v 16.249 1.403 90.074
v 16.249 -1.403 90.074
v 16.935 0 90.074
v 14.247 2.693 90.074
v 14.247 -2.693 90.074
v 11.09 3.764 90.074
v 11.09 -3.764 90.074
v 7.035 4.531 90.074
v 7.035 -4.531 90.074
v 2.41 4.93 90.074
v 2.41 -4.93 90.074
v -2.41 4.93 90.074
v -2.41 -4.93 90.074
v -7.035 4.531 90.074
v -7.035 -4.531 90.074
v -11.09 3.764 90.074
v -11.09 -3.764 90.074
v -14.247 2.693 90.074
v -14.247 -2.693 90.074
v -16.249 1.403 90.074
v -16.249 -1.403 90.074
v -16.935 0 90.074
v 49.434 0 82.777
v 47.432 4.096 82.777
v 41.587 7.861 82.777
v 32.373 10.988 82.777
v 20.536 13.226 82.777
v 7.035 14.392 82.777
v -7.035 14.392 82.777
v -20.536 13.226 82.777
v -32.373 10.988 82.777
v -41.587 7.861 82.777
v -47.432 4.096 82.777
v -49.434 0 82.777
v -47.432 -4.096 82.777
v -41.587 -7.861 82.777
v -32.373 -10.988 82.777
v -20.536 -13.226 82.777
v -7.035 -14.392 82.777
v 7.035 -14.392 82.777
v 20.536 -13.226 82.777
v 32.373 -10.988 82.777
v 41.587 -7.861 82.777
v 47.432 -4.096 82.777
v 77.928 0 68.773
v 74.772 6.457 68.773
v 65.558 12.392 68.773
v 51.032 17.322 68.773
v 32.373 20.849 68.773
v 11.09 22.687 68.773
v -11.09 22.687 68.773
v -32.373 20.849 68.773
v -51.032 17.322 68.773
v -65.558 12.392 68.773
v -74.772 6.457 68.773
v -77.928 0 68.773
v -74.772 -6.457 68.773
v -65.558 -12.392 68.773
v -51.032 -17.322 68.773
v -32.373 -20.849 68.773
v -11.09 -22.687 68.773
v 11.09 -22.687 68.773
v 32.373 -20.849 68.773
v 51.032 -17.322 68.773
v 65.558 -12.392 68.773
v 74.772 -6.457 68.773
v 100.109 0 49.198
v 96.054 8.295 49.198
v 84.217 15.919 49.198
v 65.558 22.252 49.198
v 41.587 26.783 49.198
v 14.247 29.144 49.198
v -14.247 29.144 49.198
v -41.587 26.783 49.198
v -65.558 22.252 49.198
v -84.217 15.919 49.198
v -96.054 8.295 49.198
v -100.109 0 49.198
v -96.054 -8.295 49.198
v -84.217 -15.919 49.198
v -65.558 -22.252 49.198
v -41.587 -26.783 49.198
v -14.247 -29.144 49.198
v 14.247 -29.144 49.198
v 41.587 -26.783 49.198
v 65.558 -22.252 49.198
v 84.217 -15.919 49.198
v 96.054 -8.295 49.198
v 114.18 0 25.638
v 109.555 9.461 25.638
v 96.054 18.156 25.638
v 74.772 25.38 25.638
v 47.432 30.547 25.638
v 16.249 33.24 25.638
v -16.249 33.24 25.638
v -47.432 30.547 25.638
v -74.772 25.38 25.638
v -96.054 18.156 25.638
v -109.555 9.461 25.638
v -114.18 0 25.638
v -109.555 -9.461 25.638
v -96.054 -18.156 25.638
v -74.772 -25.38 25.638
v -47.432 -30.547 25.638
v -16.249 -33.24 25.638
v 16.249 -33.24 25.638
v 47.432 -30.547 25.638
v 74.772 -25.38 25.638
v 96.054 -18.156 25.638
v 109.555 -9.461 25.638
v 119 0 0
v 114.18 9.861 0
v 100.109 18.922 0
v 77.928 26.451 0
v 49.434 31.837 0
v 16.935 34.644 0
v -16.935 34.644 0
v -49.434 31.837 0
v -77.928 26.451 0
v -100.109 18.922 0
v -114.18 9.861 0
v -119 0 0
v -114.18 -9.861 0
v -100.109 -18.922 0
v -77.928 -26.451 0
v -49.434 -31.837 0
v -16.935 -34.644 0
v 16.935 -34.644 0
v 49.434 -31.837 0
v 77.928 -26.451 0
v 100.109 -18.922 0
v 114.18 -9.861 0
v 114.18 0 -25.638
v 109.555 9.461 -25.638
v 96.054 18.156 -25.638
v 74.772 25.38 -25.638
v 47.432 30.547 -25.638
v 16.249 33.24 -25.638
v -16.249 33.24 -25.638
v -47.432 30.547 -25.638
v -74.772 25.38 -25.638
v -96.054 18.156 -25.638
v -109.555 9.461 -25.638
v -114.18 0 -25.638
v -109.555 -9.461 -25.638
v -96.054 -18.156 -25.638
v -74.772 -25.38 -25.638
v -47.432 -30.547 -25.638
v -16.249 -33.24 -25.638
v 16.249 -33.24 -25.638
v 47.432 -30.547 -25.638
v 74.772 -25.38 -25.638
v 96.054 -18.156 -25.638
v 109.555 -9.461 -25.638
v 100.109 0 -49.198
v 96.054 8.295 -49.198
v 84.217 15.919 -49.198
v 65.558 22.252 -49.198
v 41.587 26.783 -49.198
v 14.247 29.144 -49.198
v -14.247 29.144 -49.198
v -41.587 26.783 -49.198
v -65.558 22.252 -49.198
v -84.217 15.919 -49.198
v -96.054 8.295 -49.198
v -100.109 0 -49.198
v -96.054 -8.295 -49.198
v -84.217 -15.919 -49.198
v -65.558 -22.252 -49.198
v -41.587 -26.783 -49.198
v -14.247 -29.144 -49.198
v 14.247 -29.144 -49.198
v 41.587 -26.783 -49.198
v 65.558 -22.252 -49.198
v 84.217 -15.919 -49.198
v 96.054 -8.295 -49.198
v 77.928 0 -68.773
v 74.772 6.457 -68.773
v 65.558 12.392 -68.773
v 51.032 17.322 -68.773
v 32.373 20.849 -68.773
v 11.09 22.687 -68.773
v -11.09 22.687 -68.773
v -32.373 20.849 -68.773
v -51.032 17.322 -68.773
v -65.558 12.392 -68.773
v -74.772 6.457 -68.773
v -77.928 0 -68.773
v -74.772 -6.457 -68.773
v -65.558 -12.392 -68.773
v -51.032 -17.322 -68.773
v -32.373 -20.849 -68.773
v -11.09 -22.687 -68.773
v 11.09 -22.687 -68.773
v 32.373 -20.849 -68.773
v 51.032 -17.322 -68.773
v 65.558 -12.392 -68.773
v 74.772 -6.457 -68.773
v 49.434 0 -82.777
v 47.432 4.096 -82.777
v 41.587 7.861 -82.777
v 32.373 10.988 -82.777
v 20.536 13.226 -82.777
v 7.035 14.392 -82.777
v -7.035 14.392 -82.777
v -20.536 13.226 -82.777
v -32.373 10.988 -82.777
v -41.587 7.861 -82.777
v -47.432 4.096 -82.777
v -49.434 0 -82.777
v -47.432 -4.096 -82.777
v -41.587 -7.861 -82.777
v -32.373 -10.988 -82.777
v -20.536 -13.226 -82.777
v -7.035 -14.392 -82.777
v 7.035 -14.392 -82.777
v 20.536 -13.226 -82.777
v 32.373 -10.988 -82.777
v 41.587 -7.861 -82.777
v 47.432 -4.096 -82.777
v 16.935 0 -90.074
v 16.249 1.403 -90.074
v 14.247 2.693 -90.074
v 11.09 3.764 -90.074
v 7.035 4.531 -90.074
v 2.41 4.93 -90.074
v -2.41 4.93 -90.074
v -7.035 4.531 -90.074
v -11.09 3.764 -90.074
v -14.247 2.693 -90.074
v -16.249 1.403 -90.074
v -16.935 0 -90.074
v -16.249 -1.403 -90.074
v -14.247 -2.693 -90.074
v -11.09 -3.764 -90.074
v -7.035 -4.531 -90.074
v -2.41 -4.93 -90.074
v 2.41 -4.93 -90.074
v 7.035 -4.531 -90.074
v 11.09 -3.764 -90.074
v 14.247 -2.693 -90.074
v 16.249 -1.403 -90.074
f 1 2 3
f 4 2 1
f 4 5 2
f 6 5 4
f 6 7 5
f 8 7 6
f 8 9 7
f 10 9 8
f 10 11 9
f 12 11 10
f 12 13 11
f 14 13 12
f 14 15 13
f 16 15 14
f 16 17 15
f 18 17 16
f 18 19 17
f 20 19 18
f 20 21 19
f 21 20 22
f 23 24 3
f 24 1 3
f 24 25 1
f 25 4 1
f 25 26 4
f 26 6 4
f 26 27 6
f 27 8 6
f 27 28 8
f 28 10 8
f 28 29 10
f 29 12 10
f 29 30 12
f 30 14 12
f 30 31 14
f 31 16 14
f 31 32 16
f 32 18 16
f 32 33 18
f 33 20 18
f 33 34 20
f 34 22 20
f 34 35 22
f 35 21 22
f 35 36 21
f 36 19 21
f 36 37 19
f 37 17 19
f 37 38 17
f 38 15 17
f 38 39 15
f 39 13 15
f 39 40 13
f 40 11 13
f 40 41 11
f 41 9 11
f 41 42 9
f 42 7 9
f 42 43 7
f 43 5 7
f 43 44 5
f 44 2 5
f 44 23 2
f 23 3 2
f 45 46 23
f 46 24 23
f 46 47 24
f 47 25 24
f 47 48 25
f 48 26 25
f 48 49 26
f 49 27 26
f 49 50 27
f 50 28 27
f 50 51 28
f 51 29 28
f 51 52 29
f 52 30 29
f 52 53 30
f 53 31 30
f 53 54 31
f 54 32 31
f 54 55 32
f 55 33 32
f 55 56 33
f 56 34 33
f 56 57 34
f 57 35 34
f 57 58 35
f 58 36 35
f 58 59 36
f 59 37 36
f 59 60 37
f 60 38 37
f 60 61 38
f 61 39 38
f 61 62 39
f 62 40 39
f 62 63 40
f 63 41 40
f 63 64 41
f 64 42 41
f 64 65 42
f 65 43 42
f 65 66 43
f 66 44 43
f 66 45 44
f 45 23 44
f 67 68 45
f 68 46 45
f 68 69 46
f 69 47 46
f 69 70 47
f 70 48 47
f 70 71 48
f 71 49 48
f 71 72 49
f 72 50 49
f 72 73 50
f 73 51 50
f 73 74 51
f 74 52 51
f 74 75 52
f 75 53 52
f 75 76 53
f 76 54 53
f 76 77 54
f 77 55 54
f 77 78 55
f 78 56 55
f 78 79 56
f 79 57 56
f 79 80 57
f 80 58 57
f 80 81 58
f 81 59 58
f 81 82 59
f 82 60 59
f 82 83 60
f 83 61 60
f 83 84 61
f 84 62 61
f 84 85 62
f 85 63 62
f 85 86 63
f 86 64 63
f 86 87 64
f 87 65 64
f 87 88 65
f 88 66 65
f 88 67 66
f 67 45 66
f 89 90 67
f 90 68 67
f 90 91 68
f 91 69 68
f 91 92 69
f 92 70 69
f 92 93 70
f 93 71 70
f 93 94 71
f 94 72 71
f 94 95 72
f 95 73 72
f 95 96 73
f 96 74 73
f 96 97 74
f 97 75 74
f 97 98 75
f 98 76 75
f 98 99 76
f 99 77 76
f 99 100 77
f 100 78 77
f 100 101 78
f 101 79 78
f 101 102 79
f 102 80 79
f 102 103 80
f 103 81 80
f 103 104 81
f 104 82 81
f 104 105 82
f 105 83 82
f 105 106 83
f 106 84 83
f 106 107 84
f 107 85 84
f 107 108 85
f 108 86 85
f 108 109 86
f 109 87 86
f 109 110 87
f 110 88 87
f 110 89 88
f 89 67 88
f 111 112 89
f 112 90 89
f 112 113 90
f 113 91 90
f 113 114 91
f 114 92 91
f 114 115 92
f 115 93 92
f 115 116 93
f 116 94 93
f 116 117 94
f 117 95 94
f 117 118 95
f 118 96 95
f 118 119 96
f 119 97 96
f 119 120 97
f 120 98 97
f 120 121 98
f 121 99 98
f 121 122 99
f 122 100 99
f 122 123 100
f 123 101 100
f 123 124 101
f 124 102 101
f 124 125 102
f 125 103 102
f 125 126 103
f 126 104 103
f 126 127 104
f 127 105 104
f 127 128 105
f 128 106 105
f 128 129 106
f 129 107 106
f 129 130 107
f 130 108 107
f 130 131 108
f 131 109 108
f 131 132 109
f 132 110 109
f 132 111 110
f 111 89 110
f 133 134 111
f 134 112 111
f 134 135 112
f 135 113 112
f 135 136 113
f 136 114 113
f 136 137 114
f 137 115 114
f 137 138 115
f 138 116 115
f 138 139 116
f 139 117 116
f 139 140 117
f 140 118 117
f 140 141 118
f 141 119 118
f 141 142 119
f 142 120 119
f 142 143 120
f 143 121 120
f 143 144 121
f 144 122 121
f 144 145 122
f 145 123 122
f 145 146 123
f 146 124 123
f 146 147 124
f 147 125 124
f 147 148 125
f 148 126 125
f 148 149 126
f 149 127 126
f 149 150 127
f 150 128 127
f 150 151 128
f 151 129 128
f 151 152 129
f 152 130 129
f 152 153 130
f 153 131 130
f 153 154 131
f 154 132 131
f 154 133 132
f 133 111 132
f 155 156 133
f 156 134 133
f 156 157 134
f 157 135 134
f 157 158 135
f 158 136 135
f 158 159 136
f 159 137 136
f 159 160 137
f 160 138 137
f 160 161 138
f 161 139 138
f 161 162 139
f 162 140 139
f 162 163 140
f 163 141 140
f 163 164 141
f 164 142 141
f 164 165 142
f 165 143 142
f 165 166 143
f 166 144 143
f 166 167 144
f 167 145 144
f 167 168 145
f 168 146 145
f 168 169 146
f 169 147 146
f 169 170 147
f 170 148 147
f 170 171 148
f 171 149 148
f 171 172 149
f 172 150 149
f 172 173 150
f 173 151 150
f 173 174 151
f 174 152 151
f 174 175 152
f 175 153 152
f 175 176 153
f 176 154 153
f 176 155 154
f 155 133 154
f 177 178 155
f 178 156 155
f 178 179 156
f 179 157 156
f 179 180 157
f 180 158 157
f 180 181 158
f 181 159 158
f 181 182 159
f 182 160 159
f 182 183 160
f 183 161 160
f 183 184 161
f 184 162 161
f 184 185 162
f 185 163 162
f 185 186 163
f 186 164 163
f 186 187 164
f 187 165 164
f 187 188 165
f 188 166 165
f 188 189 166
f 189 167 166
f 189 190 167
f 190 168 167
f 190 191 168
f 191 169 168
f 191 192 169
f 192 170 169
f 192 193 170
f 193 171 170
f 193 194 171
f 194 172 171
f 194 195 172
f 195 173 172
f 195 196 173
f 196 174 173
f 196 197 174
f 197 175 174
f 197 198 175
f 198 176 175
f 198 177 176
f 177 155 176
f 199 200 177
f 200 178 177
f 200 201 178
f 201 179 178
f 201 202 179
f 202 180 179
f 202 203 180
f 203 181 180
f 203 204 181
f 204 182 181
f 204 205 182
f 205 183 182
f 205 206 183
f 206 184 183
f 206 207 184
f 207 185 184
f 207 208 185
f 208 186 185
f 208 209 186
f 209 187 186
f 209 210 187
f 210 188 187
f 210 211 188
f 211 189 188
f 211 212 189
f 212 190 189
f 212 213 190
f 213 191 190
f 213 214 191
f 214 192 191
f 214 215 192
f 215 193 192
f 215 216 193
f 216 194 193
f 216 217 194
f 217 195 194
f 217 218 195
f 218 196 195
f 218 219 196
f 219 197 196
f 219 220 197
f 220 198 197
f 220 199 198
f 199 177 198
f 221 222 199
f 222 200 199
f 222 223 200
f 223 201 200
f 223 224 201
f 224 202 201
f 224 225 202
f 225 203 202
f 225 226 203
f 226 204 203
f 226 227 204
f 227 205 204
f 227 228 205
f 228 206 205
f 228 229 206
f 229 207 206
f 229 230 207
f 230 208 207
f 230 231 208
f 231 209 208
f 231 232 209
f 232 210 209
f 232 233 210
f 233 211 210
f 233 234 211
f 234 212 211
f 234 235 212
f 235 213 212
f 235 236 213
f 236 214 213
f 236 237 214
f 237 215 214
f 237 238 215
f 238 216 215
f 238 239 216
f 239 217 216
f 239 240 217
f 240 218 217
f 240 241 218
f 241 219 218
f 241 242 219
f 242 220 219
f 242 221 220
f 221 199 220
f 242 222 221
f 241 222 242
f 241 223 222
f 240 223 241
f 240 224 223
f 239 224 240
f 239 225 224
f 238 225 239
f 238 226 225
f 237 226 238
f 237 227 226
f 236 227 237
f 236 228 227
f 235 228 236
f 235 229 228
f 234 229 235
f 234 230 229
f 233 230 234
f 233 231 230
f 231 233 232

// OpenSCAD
// Generated by SolidPython 1.0.1 on 2020-07-29 00:46:52


scale(v = [17, 5, 13]) {
	sphere(r = 7);
}
/***********************************************
*********      SolidPython code:      **********
************************************************
 
# import packages: SolidPython
from solid import *
from solid.utils import *
from itertools import chain, combinations, permutations


class Resize:

    def __init__(self, scad_file):
        self.scad_file = scad_file
        #self.scad_file = import_scad(scad_file)
        # cone/cylinder param:
        self.r1 = 0
        self.r2 = 0
        self.h = 0
        # rectangular prism param:
        self.w = 0
        self.l = 0
        # ellipse param:
        self.r = 0

    # import OpenScad code (file name corresponds to shape)


    # classify shape + parameters
    def assign(self, param1, param2, param3):
        if self.scad_file == 'cone.scad':
            self.r1 = param1
            self.r2 = param2
            self.h = param3
        elif self.scad_file == 'cylinder.scad':
            self.r1 = param1
            self.r2 = param2
            self.h = param3
        elif self.scad_file == 'rectangularPrism.scad':
            self.h = param1
            self.l = param2
            self.w = param3
        else:
            self.r = param1
            self.h = param2

    # resize parameters
    def iterate(self):
        x = range(3, 20, 2)
        i = 1
        if self.scad_file == 'cone.scad':
            tempList = list(permutations(x, 2))
            for temp in tempList:
                param1 = temp[0]
                param2 = temp[1]
                filepath = 'produced_scad_files/' + 'cone' + str(param1) + '_' + str(param2) + '_' + '.scad'
                scad_render_to_file(cylinder(h=param1, r1=param2, r2=0), filepath)

        elif self.scad_file == 'cylinder.scad':
            tempList = list(permutations(x, 3))
            for temp in tempList:
                param1 = temp[0]
                param2 = temp[1]
                filepath = 'produced_scad_files/' + 'cylinder' + str(param1) + '_' + str(param2) + '_' + '.scad'
                scad_render_to_file(cylinder(h=param1, r1=param2, r2=param2), filepath)

        elif self.scad_file == 'rectangularPrism.scad':
            tempList = list(permutations(x, 3))
            for temp in tempList:
                param1 = temp[0]
                param2 = temp[1]
                param3 = temp[2]
                filepath = 'produced_scad_files/' + 'rectangularPrism' + str(param1) + '_' + str(param2) + '_' + str(
                    param3) + '.scad'
                scad_render_to_file(cube(size=(param1, param2, param3)), filepath)

        elif self.scad_file == 'ellipse.scad':
            tempList = list(permutations(x, 4))
            for temp in tempList:
                param1 = temp[0]
                param2 = temp[1]
                param3 = temp[2]
                param4 = temp[3]
                filepath = 'produced_scad_files/' + 'ellipse' + str(param1) + '_' + str(param2) + '_' + str(param3) + '_' + str(param4) + '.scad'
                scad_render_to_file(scale([param1, param2, param3])(sphere(r=param4)), filepath)

    def render_to_scadfile(self):
        scad_render_to_file(scad, 'example.scad') 
 
************************************************/
